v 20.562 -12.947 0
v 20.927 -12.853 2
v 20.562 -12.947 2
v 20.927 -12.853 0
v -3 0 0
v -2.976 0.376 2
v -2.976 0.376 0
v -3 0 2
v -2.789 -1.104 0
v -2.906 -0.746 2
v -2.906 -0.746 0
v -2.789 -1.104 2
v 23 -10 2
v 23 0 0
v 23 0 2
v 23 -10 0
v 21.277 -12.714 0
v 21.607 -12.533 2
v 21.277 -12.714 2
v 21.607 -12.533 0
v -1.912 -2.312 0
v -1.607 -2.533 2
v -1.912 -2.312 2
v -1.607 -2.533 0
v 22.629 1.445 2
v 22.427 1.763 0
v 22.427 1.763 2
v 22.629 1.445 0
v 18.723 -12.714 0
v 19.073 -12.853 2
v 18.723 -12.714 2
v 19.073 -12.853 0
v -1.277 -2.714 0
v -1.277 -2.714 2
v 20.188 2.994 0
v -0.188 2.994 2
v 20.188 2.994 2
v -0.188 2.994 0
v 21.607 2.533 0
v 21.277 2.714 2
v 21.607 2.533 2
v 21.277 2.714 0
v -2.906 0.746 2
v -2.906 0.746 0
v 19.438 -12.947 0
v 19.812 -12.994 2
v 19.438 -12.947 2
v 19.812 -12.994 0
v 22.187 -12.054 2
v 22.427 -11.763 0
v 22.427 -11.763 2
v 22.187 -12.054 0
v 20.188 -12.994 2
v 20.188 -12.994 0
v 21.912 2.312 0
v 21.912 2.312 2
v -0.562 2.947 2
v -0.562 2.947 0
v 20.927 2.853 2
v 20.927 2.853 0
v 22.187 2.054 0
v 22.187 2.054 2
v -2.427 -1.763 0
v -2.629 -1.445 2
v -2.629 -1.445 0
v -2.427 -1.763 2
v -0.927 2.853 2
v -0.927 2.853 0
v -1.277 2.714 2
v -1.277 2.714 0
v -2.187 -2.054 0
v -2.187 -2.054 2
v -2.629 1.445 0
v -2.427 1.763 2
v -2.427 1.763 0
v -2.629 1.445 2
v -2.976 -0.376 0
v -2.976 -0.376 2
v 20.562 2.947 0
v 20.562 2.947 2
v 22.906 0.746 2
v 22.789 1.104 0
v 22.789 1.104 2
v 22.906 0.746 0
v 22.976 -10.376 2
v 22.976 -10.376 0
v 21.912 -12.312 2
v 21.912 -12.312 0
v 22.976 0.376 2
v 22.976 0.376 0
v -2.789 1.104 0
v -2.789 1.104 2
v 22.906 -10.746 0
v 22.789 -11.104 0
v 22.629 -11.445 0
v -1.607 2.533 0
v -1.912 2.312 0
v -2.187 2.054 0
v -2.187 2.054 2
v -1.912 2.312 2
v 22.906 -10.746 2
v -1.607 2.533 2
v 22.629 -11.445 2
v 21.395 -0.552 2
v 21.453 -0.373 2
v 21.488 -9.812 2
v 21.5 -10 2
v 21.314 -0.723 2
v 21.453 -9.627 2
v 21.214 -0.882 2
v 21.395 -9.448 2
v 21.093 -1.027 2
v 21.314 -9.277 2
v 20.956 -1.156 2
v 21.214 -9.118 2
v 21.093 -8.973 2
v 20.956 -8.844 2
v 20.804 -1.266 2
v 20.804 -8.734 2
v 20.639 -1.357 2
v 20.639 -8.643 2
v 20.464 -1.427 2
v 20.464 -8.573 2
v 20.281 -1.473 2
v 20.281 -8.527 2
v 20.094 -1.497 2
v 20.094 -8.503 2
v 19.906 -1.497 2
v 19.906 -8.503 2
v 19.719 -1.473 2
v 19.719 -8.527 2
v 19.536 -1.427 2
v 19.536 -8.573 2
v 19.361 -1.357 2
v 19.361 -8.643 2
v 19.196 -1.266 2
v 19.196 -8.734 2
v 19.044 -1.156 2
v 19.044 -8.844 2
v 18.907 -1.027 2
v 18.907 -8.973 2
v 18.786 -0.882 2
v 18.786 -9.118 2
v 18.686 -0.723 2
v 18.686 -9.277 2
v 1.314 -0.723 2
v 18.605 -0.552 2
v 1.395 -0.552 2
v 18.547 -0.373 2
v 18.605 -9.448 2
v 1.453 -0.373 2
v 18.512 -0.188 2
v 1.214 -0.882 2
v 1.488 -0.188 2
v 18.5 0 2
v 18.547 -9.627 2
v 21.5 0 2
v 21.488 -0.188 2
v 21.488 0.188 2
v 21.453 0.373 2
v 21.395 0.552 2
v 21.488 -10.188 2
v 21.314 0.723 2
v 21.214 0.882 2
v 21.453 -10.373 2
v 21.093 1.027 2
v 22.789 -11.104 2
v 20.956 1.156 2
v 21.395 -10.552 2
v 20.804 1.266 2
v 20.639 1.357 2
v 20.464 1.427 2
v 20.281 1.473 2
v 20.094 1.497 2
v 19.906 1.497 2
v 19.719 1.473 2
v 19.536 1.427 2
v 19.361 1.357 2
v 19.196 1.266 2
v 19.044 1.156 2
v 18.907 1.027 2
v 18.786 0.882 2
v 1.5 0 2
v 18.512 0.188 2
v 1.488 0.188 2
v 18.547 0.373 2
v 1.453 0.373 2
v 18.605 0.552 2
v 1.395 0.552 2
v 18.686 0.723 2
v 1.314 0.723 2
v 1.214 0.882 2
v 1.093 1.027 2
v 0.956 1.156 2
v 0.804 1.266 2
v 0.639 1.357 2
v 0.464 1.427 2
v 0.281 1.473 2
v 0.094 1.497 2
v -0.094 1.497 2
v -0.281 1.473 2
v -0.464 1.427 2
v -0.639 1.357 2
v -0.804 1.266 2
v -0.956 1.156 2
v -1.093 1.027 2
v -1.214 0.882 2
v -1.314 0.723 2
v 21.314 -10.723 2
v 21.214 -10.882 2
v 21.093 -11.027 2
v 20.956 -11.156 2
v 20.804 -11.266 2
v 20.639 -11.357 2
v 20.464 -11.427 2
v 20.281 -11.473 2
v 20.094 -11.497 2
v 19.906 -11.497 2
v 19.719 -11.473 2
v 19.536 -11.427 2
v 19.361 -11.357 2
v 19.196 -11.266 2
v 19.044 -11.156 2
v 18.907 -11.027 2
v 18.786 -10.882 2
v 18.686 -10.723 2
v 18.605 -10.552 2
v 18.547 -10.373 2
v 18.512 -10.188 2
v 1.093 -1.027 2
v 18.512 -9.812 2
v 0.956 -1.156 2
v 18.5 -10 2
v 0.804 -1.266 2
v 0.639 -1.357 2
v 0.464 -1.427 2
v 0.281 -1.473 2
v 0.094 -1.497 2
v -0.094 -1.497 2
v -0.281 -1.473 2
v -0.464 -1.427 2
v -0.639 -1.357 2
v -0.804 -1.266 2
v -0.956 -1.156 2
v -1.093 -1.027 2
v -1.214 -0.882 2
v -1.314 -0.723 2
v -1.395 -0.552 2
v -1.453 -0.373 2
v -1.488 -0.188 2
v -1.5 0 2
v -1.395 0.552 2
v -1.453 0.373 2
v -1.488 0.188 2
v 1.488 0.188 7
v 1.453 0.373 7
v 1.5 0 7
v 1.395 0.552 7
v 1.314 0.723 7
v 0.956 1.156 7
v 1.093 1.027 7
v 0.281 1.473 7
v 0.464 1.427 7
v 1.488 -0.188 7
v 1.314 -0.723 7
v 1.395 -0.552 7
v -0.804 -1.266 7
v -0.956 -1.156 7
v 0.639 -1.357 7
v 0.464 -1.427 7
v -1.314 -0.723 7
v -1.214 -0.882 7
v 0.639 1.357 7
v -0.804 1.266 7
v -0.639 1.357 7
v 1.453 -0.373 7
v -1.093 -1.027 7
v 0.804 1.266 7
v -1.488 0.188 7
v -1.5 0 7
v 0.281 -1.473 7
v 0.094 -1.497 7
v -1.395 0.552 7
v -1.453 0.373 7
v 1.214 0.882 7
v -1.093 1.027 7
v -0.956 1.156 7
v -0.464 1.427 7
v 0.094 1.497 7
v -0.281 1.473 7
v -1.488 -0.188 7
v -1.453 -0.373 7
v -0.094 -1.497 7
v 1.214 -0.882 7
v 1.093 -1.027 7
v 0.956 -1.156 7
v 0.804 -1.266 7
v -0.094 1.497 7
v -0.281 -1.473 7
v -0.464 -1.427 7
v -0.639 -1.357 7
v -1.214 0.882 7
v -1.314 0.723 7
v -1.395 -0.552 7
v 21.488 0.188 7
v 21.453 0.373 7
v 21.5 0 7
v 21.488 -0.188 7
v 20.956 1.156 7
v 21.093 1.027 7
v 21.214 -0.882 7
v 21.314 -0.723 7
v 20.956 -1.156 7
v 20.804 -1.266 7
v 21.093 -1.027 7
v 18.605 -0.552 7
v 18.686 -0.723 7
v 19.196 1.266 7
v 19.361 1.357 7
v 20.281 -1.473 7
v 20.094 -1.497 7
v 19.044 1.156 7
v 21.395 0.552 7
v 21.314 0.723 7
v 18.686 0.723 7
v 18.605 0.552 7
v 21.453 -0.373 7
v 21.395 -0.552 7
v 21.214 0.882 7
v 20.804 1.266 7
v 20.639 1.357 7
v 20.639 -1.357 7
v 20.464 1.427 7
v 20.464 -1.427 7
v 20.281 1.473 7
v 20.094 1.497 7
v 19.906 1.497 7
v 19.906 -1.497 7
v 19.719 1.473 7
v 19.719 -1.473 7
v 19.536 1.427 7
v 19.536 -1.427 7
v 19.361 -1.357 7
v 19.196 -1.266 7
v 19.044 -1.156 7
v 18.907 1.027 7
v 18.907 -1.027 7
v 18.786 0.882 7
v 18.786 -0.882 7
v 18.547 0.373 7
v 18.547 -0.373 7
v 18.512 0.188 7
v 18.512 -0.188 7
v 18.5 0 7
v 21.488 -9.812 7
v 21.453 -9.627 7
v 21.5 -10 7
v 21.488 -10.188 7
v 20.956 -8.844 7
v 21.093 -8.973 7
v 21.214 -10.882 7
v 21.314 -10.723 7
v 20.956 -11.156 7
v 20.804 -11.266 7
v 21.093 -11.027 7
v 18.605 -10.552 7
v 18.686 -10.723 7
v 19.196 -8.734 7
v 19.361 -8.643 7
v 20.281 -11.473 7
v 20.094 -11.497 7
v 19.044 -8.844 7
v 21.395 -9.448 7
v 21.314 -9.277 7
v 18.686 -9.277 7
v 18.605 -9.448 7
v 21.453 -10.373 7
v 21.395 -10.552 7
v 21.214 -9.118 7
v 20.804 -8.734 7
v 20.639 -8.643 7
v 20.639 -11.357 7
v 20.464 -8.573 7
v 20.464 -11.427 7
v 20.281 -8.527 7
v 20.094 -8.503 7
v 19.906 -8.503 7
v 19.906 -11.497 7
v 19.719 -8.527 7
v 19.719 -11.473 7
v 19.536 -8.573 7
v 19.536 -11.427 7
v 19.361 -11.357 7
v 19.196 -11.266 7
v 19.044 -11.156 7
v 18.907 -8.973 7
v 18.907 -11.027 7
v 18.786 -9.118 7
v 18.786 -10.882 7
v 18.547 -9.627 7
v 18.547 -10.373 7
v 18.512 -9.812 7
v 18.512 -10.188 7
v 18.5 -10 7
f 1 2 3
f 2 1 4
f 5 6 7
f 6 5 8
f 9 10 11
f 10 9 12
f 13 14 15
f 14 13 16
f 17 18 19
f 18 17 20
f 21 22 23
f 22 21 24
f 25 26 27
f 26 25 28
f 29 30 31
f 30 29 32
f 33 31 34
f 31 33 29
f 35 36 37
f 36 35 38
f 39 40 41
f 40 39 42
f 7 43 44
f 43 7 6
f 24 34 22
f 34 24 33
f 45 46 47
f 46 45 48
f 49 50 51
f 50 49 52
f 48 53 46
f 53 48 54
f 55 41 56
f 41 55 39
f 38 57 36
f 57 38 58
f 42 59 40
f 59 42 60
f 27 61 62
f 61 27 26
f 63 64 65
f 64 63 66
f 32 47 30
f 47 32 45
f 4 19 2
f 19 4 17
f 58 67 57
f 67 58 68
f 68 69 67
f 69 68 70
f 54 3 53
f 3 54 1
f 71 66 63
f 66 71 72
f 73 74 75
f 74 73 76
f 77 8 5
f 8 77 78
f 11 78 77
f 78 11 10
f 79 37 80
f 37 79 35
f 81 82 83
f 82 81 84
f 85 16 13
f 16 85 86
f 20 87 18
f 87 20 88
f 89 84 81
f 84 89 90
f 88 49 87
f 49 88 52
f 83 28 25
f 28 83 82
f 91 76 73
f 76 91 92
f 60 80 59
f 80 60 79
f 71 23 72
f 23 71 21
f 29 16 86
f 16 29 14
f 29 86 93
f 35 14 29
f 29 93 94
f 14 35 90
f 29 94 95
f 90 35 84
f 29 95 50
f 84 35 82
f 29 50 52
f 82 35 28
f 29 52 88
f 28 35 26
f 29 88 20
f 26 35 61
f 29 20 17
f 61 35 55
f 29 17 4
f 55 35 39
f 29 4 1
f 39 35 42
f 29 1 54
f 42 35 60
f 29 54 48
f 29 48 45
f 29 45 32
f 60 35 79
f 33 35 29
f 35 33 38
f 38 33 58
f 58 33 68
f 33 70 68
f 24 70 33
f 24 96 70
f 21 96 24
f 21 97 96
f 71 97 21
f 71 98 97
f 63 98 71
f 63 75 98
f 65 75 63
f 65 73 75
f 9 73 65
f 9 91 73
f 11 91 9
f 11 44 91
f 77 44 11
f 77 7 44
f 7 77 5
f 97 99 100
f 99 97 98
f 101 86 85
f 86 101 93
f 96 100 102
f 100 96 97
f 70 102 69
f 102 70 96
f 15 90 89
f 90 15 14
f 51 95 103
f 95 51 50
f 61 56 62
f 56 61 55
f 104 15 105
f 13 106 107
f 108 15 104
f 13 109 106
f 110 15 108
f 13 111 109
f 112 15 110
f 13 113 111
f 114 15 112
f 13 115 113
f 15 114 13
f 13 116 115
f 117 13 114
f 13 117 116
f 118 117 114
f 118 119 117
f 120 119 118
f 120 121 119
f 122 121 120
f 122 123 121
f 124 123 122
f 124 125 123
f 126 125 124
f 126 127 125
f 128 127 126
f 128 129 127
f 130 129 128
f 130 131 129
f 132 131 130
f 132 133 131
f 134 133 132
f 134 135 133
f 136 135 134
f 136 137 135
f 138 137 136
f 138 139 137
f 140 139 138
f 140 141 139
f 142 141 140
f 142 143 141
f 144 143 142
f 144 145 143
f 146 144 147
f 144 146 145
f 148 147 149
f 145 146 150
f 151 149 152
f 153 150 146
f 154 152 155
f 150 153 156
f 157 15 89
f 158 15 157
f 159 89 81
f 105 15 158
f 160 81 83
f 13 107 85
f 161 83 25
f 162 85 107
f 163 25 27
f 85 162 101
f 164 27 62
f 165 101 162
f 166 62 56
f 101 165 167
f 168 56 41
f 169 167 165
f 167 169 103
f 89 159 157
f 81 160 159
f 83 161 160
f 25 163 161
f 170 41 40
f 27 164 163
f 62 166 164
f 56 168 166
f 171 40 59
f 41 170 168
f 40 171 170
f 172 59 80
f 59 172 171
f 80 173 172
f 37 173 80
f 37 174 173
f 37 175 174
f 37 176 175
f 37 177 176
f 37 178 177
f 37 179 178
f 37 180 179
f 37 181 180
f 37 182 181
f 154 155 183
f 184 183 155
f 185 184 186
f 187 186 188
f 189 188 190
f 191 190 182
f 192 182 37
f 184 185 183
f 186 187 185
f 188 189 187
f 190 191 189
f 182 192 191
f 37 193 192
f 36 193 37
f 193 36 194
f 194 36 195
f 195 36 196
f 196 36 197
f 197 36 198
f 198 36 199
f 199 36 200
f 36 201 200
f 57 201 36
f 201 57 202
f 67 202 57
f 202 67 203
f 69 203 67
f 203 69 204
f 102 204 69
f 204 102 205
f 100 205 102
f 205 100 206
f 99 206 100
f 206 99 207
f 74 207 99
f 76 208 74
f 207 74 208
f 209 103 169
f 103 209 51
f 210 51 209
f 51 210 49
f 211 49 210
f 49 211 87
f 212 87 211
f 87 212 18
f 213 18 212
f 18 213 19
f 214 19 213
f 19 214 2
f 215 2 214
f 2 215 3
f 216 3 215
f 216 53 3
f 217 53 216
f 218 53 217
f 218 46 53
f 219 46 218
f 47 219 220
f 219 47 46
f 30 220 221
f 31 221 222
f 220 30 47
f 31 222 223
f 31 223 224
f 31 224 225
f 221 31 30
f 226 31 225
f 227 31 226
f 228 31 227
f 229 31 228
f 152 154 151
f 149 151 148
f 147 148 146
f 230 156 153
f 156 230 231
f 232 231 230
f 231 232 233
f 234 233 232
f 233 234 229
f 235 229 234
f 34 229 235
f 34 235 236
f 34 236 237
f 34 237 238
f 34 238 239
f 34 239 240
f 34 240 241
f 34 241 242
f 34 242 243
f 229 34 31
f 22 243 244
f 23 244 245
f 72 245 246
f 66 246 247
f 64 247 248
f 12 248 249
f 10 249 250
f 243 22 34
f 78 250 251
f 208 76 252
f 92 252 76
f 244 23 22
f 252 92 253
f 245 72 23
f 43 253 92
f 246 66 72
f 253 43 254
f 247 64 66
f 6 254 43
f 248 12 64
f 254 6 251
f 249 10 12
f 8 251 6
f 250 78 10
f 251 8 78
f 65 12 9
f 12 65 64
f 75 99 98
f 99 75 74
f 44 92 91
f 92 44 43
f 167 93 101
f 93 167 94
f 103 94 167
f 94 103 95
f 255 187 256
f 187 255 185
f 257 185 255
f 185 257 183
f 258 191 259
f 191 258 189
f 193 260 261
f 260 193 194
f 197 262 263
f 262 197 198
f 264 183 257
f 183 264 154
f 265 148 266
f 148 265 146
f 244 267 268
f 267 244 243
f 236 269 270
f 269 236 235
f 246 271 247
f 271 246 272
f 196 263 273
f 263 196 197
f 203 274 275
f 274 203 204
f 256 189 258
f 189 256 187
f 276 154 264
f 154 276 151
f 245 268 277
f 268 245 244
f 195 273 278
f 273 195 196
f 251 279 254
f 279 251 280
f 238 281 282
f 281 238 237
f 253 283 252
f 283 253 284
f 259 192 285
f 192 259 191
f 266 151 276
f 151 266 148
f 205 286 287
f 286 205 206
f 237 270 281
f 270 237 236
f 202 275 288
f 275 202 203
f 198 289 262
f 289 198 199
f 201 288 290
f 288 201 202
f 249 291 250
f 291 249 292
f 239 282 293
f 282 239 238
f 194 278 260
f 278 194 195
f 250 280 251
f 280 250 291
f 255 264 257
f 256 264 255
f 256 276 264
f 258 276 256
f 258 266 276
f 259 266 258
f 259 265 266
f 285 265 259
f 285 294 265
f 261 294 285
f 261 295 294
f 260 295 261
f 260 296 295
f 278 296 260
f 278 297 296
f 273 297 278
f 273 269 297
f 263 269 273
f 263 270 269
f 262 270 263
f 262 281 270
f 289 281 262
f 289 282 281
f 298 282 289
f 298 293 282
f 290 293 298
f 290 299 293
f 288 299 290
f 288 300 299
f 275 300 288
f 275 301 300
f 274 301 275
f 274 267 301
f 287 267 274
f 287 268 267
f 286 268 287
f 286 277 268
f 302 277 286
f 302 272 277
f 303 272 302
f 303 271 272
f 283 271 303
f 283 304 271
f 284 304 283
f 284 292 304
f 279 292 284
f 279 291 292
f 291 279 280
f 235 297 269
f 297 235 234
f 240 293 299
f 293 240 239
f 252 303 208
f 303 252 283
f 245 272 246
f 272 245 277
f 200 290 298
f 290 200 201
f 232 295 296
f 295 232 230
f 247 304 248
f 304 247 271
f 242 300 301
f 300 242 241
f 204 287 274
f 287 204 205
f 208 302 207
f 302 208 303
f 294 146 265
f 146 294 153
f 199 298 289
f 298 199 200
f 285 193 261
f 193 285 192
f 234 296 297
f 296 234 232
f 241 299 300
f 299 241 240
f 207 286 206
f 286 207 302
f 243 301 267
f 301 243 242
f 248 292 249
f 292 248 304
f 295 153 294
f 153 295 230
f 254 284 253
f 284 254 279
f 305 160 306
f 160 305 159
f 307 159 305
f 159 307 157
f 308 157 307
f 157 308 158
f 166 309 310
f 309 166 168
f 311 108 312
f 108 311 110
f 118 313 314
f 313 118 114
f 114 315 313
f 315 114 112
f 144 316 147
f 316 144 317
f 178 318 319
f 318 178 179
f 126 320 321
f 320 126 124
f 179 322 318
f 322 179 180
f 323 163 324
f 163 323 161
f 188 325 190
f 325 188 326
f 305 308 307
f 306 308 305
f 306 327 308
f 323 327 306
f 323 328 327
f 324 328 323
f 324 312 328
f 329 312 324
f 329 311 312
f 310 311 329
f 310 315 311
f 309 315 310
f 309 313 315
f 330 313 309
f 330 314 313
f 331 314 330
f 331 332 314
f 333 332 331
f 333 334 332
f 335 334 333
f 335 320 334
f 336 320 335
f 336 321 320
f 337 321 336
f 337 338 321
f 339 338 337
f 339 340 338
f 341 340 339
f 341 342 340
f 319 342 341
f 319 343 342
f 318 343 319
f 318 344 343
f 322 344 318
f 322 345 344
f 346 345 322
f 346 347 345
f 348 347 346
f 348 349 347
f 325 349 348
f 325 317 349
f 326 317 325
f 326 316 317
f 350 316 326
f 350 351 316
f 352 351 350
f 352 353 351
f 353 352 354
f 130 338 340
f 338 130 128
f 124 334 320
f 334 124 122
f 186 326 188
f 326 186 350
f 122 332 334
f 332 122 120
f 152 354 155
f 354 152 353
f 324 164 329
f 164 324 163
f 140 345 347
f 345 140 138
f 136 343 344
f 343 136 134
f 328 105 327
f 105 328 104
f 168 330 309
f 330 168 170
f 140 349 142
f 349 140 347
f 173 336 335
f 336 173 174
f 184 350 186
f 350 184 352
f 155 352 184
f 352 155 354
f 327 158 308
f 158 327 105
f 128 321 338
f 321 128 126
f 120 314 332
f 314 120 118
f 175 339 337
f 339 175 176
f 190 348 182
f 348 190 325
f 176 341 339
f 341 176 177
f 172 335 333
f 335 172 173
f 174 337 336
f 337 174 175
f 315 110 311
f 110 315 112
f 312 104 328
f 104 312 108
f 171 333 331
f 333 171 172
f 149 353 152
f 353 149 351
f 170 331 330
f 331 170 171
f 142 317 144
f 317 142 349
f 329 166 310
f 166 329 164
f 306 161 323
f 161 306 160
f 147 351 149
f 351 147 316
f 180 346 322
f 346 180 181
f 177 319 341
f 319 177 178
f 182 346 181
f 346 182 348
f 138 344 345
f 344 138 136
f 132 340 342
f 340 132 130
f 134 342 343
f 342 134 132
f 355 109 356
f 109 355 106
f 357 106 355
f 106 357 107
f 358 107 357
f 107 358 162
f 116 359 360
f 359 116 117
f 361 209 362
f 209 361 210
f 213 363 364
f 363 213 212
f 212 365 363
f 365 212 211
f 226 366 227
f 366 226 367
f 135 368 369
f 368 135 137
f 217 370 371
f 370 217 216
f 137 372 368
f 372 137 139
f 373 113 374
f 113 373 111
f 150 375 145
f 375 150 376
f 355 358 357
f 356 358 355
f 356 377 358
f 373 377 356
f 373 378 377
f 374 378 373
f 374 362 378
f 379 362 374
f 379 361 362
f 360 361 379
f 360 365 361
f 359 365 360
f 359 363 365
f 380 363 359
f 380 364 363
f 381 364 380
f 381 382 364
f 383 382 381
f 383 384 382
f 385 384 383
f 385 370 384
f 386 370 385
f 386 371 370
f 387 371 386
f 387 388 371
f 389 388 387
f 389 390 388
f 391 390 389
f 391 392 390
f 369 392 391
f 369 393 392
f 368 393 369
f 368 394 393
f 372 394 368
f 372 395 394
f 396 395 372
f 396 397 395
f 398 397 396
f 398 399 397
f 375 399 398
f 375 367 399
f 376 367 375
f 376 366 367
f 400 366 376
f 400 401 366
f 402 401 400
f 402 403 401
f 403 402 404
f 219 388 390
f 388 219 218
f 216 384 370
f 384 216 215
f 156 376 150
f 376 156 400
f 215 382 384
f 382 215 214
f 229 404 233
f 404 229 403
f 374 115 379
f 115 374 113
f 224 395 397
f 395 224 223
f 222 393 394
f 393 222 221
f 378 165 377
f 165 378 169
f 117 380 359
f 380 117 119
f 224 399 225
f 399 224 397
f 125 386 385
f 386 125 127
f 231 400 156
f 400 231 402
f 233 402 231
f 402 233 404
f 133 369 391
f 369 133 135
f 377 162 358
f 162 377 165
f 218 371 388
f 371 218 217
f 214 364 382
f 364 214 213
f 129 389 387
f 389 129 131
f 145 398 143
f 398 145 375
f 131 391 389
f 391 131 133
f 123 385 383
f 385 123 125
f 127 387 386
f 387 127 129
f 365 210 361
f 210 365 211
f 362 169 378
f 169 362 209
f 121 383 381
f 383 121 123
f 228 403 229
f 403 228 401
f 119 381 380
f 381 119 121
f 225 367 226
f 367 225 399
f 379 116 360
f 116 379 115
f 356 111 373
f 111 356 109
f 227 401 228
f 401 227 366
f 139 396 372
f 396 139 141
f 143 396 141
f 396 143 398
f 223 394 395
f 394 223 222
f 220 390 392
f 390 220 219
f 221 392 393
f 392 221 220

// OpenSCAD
//Title: haptistrap_elastic_primer
//Project: HaptiStrap
//Author: BLINDED
//Affiliation: BLINDED
//
//Description: Design file for the elastic primer. Change line 13 to the number of elastics that should be pre-stretched.


// Number of faces on cylinders, sphere, etc.
$fn=50;

use_printed_tensioner = 1;
use_elastic_tensioner = 0;

// Number of elastics to prime
n_elastics = 8;

if (use_elastic_tensioner == 1){
    // Base plate
    translate([n_elastics*5/2,0,1]) cube([n_elastics*5, 10, 1], center=true);

    // Place posts on base plate
    for (n=[1:n_elastics]){
        translate([(n-1)*5+2.5,0,0]){
            translate([0,-5+1.5,1]) cylinder(r=1.5, h=3);
            translate([0,5-1.5,1]) cylinder(r=1.5, h=3);
        }
    }
}

if (use_printed_tensioner == 1){
    // base plate
    hull(){
        cylinder(r=3, h=2);
        translate([20,0,0]) cylinder(r=3, h=2);
        translate([20,-10,0]) cylinder(r=3, h=2);
    }
    
    // posts
    cylinder(r=1.5, h=7);
    translate([20,0,0]) cylinder(r=1.5, h=7);
    translate([20,-10,0]) cylinder(r=1.5, h=7);

}
